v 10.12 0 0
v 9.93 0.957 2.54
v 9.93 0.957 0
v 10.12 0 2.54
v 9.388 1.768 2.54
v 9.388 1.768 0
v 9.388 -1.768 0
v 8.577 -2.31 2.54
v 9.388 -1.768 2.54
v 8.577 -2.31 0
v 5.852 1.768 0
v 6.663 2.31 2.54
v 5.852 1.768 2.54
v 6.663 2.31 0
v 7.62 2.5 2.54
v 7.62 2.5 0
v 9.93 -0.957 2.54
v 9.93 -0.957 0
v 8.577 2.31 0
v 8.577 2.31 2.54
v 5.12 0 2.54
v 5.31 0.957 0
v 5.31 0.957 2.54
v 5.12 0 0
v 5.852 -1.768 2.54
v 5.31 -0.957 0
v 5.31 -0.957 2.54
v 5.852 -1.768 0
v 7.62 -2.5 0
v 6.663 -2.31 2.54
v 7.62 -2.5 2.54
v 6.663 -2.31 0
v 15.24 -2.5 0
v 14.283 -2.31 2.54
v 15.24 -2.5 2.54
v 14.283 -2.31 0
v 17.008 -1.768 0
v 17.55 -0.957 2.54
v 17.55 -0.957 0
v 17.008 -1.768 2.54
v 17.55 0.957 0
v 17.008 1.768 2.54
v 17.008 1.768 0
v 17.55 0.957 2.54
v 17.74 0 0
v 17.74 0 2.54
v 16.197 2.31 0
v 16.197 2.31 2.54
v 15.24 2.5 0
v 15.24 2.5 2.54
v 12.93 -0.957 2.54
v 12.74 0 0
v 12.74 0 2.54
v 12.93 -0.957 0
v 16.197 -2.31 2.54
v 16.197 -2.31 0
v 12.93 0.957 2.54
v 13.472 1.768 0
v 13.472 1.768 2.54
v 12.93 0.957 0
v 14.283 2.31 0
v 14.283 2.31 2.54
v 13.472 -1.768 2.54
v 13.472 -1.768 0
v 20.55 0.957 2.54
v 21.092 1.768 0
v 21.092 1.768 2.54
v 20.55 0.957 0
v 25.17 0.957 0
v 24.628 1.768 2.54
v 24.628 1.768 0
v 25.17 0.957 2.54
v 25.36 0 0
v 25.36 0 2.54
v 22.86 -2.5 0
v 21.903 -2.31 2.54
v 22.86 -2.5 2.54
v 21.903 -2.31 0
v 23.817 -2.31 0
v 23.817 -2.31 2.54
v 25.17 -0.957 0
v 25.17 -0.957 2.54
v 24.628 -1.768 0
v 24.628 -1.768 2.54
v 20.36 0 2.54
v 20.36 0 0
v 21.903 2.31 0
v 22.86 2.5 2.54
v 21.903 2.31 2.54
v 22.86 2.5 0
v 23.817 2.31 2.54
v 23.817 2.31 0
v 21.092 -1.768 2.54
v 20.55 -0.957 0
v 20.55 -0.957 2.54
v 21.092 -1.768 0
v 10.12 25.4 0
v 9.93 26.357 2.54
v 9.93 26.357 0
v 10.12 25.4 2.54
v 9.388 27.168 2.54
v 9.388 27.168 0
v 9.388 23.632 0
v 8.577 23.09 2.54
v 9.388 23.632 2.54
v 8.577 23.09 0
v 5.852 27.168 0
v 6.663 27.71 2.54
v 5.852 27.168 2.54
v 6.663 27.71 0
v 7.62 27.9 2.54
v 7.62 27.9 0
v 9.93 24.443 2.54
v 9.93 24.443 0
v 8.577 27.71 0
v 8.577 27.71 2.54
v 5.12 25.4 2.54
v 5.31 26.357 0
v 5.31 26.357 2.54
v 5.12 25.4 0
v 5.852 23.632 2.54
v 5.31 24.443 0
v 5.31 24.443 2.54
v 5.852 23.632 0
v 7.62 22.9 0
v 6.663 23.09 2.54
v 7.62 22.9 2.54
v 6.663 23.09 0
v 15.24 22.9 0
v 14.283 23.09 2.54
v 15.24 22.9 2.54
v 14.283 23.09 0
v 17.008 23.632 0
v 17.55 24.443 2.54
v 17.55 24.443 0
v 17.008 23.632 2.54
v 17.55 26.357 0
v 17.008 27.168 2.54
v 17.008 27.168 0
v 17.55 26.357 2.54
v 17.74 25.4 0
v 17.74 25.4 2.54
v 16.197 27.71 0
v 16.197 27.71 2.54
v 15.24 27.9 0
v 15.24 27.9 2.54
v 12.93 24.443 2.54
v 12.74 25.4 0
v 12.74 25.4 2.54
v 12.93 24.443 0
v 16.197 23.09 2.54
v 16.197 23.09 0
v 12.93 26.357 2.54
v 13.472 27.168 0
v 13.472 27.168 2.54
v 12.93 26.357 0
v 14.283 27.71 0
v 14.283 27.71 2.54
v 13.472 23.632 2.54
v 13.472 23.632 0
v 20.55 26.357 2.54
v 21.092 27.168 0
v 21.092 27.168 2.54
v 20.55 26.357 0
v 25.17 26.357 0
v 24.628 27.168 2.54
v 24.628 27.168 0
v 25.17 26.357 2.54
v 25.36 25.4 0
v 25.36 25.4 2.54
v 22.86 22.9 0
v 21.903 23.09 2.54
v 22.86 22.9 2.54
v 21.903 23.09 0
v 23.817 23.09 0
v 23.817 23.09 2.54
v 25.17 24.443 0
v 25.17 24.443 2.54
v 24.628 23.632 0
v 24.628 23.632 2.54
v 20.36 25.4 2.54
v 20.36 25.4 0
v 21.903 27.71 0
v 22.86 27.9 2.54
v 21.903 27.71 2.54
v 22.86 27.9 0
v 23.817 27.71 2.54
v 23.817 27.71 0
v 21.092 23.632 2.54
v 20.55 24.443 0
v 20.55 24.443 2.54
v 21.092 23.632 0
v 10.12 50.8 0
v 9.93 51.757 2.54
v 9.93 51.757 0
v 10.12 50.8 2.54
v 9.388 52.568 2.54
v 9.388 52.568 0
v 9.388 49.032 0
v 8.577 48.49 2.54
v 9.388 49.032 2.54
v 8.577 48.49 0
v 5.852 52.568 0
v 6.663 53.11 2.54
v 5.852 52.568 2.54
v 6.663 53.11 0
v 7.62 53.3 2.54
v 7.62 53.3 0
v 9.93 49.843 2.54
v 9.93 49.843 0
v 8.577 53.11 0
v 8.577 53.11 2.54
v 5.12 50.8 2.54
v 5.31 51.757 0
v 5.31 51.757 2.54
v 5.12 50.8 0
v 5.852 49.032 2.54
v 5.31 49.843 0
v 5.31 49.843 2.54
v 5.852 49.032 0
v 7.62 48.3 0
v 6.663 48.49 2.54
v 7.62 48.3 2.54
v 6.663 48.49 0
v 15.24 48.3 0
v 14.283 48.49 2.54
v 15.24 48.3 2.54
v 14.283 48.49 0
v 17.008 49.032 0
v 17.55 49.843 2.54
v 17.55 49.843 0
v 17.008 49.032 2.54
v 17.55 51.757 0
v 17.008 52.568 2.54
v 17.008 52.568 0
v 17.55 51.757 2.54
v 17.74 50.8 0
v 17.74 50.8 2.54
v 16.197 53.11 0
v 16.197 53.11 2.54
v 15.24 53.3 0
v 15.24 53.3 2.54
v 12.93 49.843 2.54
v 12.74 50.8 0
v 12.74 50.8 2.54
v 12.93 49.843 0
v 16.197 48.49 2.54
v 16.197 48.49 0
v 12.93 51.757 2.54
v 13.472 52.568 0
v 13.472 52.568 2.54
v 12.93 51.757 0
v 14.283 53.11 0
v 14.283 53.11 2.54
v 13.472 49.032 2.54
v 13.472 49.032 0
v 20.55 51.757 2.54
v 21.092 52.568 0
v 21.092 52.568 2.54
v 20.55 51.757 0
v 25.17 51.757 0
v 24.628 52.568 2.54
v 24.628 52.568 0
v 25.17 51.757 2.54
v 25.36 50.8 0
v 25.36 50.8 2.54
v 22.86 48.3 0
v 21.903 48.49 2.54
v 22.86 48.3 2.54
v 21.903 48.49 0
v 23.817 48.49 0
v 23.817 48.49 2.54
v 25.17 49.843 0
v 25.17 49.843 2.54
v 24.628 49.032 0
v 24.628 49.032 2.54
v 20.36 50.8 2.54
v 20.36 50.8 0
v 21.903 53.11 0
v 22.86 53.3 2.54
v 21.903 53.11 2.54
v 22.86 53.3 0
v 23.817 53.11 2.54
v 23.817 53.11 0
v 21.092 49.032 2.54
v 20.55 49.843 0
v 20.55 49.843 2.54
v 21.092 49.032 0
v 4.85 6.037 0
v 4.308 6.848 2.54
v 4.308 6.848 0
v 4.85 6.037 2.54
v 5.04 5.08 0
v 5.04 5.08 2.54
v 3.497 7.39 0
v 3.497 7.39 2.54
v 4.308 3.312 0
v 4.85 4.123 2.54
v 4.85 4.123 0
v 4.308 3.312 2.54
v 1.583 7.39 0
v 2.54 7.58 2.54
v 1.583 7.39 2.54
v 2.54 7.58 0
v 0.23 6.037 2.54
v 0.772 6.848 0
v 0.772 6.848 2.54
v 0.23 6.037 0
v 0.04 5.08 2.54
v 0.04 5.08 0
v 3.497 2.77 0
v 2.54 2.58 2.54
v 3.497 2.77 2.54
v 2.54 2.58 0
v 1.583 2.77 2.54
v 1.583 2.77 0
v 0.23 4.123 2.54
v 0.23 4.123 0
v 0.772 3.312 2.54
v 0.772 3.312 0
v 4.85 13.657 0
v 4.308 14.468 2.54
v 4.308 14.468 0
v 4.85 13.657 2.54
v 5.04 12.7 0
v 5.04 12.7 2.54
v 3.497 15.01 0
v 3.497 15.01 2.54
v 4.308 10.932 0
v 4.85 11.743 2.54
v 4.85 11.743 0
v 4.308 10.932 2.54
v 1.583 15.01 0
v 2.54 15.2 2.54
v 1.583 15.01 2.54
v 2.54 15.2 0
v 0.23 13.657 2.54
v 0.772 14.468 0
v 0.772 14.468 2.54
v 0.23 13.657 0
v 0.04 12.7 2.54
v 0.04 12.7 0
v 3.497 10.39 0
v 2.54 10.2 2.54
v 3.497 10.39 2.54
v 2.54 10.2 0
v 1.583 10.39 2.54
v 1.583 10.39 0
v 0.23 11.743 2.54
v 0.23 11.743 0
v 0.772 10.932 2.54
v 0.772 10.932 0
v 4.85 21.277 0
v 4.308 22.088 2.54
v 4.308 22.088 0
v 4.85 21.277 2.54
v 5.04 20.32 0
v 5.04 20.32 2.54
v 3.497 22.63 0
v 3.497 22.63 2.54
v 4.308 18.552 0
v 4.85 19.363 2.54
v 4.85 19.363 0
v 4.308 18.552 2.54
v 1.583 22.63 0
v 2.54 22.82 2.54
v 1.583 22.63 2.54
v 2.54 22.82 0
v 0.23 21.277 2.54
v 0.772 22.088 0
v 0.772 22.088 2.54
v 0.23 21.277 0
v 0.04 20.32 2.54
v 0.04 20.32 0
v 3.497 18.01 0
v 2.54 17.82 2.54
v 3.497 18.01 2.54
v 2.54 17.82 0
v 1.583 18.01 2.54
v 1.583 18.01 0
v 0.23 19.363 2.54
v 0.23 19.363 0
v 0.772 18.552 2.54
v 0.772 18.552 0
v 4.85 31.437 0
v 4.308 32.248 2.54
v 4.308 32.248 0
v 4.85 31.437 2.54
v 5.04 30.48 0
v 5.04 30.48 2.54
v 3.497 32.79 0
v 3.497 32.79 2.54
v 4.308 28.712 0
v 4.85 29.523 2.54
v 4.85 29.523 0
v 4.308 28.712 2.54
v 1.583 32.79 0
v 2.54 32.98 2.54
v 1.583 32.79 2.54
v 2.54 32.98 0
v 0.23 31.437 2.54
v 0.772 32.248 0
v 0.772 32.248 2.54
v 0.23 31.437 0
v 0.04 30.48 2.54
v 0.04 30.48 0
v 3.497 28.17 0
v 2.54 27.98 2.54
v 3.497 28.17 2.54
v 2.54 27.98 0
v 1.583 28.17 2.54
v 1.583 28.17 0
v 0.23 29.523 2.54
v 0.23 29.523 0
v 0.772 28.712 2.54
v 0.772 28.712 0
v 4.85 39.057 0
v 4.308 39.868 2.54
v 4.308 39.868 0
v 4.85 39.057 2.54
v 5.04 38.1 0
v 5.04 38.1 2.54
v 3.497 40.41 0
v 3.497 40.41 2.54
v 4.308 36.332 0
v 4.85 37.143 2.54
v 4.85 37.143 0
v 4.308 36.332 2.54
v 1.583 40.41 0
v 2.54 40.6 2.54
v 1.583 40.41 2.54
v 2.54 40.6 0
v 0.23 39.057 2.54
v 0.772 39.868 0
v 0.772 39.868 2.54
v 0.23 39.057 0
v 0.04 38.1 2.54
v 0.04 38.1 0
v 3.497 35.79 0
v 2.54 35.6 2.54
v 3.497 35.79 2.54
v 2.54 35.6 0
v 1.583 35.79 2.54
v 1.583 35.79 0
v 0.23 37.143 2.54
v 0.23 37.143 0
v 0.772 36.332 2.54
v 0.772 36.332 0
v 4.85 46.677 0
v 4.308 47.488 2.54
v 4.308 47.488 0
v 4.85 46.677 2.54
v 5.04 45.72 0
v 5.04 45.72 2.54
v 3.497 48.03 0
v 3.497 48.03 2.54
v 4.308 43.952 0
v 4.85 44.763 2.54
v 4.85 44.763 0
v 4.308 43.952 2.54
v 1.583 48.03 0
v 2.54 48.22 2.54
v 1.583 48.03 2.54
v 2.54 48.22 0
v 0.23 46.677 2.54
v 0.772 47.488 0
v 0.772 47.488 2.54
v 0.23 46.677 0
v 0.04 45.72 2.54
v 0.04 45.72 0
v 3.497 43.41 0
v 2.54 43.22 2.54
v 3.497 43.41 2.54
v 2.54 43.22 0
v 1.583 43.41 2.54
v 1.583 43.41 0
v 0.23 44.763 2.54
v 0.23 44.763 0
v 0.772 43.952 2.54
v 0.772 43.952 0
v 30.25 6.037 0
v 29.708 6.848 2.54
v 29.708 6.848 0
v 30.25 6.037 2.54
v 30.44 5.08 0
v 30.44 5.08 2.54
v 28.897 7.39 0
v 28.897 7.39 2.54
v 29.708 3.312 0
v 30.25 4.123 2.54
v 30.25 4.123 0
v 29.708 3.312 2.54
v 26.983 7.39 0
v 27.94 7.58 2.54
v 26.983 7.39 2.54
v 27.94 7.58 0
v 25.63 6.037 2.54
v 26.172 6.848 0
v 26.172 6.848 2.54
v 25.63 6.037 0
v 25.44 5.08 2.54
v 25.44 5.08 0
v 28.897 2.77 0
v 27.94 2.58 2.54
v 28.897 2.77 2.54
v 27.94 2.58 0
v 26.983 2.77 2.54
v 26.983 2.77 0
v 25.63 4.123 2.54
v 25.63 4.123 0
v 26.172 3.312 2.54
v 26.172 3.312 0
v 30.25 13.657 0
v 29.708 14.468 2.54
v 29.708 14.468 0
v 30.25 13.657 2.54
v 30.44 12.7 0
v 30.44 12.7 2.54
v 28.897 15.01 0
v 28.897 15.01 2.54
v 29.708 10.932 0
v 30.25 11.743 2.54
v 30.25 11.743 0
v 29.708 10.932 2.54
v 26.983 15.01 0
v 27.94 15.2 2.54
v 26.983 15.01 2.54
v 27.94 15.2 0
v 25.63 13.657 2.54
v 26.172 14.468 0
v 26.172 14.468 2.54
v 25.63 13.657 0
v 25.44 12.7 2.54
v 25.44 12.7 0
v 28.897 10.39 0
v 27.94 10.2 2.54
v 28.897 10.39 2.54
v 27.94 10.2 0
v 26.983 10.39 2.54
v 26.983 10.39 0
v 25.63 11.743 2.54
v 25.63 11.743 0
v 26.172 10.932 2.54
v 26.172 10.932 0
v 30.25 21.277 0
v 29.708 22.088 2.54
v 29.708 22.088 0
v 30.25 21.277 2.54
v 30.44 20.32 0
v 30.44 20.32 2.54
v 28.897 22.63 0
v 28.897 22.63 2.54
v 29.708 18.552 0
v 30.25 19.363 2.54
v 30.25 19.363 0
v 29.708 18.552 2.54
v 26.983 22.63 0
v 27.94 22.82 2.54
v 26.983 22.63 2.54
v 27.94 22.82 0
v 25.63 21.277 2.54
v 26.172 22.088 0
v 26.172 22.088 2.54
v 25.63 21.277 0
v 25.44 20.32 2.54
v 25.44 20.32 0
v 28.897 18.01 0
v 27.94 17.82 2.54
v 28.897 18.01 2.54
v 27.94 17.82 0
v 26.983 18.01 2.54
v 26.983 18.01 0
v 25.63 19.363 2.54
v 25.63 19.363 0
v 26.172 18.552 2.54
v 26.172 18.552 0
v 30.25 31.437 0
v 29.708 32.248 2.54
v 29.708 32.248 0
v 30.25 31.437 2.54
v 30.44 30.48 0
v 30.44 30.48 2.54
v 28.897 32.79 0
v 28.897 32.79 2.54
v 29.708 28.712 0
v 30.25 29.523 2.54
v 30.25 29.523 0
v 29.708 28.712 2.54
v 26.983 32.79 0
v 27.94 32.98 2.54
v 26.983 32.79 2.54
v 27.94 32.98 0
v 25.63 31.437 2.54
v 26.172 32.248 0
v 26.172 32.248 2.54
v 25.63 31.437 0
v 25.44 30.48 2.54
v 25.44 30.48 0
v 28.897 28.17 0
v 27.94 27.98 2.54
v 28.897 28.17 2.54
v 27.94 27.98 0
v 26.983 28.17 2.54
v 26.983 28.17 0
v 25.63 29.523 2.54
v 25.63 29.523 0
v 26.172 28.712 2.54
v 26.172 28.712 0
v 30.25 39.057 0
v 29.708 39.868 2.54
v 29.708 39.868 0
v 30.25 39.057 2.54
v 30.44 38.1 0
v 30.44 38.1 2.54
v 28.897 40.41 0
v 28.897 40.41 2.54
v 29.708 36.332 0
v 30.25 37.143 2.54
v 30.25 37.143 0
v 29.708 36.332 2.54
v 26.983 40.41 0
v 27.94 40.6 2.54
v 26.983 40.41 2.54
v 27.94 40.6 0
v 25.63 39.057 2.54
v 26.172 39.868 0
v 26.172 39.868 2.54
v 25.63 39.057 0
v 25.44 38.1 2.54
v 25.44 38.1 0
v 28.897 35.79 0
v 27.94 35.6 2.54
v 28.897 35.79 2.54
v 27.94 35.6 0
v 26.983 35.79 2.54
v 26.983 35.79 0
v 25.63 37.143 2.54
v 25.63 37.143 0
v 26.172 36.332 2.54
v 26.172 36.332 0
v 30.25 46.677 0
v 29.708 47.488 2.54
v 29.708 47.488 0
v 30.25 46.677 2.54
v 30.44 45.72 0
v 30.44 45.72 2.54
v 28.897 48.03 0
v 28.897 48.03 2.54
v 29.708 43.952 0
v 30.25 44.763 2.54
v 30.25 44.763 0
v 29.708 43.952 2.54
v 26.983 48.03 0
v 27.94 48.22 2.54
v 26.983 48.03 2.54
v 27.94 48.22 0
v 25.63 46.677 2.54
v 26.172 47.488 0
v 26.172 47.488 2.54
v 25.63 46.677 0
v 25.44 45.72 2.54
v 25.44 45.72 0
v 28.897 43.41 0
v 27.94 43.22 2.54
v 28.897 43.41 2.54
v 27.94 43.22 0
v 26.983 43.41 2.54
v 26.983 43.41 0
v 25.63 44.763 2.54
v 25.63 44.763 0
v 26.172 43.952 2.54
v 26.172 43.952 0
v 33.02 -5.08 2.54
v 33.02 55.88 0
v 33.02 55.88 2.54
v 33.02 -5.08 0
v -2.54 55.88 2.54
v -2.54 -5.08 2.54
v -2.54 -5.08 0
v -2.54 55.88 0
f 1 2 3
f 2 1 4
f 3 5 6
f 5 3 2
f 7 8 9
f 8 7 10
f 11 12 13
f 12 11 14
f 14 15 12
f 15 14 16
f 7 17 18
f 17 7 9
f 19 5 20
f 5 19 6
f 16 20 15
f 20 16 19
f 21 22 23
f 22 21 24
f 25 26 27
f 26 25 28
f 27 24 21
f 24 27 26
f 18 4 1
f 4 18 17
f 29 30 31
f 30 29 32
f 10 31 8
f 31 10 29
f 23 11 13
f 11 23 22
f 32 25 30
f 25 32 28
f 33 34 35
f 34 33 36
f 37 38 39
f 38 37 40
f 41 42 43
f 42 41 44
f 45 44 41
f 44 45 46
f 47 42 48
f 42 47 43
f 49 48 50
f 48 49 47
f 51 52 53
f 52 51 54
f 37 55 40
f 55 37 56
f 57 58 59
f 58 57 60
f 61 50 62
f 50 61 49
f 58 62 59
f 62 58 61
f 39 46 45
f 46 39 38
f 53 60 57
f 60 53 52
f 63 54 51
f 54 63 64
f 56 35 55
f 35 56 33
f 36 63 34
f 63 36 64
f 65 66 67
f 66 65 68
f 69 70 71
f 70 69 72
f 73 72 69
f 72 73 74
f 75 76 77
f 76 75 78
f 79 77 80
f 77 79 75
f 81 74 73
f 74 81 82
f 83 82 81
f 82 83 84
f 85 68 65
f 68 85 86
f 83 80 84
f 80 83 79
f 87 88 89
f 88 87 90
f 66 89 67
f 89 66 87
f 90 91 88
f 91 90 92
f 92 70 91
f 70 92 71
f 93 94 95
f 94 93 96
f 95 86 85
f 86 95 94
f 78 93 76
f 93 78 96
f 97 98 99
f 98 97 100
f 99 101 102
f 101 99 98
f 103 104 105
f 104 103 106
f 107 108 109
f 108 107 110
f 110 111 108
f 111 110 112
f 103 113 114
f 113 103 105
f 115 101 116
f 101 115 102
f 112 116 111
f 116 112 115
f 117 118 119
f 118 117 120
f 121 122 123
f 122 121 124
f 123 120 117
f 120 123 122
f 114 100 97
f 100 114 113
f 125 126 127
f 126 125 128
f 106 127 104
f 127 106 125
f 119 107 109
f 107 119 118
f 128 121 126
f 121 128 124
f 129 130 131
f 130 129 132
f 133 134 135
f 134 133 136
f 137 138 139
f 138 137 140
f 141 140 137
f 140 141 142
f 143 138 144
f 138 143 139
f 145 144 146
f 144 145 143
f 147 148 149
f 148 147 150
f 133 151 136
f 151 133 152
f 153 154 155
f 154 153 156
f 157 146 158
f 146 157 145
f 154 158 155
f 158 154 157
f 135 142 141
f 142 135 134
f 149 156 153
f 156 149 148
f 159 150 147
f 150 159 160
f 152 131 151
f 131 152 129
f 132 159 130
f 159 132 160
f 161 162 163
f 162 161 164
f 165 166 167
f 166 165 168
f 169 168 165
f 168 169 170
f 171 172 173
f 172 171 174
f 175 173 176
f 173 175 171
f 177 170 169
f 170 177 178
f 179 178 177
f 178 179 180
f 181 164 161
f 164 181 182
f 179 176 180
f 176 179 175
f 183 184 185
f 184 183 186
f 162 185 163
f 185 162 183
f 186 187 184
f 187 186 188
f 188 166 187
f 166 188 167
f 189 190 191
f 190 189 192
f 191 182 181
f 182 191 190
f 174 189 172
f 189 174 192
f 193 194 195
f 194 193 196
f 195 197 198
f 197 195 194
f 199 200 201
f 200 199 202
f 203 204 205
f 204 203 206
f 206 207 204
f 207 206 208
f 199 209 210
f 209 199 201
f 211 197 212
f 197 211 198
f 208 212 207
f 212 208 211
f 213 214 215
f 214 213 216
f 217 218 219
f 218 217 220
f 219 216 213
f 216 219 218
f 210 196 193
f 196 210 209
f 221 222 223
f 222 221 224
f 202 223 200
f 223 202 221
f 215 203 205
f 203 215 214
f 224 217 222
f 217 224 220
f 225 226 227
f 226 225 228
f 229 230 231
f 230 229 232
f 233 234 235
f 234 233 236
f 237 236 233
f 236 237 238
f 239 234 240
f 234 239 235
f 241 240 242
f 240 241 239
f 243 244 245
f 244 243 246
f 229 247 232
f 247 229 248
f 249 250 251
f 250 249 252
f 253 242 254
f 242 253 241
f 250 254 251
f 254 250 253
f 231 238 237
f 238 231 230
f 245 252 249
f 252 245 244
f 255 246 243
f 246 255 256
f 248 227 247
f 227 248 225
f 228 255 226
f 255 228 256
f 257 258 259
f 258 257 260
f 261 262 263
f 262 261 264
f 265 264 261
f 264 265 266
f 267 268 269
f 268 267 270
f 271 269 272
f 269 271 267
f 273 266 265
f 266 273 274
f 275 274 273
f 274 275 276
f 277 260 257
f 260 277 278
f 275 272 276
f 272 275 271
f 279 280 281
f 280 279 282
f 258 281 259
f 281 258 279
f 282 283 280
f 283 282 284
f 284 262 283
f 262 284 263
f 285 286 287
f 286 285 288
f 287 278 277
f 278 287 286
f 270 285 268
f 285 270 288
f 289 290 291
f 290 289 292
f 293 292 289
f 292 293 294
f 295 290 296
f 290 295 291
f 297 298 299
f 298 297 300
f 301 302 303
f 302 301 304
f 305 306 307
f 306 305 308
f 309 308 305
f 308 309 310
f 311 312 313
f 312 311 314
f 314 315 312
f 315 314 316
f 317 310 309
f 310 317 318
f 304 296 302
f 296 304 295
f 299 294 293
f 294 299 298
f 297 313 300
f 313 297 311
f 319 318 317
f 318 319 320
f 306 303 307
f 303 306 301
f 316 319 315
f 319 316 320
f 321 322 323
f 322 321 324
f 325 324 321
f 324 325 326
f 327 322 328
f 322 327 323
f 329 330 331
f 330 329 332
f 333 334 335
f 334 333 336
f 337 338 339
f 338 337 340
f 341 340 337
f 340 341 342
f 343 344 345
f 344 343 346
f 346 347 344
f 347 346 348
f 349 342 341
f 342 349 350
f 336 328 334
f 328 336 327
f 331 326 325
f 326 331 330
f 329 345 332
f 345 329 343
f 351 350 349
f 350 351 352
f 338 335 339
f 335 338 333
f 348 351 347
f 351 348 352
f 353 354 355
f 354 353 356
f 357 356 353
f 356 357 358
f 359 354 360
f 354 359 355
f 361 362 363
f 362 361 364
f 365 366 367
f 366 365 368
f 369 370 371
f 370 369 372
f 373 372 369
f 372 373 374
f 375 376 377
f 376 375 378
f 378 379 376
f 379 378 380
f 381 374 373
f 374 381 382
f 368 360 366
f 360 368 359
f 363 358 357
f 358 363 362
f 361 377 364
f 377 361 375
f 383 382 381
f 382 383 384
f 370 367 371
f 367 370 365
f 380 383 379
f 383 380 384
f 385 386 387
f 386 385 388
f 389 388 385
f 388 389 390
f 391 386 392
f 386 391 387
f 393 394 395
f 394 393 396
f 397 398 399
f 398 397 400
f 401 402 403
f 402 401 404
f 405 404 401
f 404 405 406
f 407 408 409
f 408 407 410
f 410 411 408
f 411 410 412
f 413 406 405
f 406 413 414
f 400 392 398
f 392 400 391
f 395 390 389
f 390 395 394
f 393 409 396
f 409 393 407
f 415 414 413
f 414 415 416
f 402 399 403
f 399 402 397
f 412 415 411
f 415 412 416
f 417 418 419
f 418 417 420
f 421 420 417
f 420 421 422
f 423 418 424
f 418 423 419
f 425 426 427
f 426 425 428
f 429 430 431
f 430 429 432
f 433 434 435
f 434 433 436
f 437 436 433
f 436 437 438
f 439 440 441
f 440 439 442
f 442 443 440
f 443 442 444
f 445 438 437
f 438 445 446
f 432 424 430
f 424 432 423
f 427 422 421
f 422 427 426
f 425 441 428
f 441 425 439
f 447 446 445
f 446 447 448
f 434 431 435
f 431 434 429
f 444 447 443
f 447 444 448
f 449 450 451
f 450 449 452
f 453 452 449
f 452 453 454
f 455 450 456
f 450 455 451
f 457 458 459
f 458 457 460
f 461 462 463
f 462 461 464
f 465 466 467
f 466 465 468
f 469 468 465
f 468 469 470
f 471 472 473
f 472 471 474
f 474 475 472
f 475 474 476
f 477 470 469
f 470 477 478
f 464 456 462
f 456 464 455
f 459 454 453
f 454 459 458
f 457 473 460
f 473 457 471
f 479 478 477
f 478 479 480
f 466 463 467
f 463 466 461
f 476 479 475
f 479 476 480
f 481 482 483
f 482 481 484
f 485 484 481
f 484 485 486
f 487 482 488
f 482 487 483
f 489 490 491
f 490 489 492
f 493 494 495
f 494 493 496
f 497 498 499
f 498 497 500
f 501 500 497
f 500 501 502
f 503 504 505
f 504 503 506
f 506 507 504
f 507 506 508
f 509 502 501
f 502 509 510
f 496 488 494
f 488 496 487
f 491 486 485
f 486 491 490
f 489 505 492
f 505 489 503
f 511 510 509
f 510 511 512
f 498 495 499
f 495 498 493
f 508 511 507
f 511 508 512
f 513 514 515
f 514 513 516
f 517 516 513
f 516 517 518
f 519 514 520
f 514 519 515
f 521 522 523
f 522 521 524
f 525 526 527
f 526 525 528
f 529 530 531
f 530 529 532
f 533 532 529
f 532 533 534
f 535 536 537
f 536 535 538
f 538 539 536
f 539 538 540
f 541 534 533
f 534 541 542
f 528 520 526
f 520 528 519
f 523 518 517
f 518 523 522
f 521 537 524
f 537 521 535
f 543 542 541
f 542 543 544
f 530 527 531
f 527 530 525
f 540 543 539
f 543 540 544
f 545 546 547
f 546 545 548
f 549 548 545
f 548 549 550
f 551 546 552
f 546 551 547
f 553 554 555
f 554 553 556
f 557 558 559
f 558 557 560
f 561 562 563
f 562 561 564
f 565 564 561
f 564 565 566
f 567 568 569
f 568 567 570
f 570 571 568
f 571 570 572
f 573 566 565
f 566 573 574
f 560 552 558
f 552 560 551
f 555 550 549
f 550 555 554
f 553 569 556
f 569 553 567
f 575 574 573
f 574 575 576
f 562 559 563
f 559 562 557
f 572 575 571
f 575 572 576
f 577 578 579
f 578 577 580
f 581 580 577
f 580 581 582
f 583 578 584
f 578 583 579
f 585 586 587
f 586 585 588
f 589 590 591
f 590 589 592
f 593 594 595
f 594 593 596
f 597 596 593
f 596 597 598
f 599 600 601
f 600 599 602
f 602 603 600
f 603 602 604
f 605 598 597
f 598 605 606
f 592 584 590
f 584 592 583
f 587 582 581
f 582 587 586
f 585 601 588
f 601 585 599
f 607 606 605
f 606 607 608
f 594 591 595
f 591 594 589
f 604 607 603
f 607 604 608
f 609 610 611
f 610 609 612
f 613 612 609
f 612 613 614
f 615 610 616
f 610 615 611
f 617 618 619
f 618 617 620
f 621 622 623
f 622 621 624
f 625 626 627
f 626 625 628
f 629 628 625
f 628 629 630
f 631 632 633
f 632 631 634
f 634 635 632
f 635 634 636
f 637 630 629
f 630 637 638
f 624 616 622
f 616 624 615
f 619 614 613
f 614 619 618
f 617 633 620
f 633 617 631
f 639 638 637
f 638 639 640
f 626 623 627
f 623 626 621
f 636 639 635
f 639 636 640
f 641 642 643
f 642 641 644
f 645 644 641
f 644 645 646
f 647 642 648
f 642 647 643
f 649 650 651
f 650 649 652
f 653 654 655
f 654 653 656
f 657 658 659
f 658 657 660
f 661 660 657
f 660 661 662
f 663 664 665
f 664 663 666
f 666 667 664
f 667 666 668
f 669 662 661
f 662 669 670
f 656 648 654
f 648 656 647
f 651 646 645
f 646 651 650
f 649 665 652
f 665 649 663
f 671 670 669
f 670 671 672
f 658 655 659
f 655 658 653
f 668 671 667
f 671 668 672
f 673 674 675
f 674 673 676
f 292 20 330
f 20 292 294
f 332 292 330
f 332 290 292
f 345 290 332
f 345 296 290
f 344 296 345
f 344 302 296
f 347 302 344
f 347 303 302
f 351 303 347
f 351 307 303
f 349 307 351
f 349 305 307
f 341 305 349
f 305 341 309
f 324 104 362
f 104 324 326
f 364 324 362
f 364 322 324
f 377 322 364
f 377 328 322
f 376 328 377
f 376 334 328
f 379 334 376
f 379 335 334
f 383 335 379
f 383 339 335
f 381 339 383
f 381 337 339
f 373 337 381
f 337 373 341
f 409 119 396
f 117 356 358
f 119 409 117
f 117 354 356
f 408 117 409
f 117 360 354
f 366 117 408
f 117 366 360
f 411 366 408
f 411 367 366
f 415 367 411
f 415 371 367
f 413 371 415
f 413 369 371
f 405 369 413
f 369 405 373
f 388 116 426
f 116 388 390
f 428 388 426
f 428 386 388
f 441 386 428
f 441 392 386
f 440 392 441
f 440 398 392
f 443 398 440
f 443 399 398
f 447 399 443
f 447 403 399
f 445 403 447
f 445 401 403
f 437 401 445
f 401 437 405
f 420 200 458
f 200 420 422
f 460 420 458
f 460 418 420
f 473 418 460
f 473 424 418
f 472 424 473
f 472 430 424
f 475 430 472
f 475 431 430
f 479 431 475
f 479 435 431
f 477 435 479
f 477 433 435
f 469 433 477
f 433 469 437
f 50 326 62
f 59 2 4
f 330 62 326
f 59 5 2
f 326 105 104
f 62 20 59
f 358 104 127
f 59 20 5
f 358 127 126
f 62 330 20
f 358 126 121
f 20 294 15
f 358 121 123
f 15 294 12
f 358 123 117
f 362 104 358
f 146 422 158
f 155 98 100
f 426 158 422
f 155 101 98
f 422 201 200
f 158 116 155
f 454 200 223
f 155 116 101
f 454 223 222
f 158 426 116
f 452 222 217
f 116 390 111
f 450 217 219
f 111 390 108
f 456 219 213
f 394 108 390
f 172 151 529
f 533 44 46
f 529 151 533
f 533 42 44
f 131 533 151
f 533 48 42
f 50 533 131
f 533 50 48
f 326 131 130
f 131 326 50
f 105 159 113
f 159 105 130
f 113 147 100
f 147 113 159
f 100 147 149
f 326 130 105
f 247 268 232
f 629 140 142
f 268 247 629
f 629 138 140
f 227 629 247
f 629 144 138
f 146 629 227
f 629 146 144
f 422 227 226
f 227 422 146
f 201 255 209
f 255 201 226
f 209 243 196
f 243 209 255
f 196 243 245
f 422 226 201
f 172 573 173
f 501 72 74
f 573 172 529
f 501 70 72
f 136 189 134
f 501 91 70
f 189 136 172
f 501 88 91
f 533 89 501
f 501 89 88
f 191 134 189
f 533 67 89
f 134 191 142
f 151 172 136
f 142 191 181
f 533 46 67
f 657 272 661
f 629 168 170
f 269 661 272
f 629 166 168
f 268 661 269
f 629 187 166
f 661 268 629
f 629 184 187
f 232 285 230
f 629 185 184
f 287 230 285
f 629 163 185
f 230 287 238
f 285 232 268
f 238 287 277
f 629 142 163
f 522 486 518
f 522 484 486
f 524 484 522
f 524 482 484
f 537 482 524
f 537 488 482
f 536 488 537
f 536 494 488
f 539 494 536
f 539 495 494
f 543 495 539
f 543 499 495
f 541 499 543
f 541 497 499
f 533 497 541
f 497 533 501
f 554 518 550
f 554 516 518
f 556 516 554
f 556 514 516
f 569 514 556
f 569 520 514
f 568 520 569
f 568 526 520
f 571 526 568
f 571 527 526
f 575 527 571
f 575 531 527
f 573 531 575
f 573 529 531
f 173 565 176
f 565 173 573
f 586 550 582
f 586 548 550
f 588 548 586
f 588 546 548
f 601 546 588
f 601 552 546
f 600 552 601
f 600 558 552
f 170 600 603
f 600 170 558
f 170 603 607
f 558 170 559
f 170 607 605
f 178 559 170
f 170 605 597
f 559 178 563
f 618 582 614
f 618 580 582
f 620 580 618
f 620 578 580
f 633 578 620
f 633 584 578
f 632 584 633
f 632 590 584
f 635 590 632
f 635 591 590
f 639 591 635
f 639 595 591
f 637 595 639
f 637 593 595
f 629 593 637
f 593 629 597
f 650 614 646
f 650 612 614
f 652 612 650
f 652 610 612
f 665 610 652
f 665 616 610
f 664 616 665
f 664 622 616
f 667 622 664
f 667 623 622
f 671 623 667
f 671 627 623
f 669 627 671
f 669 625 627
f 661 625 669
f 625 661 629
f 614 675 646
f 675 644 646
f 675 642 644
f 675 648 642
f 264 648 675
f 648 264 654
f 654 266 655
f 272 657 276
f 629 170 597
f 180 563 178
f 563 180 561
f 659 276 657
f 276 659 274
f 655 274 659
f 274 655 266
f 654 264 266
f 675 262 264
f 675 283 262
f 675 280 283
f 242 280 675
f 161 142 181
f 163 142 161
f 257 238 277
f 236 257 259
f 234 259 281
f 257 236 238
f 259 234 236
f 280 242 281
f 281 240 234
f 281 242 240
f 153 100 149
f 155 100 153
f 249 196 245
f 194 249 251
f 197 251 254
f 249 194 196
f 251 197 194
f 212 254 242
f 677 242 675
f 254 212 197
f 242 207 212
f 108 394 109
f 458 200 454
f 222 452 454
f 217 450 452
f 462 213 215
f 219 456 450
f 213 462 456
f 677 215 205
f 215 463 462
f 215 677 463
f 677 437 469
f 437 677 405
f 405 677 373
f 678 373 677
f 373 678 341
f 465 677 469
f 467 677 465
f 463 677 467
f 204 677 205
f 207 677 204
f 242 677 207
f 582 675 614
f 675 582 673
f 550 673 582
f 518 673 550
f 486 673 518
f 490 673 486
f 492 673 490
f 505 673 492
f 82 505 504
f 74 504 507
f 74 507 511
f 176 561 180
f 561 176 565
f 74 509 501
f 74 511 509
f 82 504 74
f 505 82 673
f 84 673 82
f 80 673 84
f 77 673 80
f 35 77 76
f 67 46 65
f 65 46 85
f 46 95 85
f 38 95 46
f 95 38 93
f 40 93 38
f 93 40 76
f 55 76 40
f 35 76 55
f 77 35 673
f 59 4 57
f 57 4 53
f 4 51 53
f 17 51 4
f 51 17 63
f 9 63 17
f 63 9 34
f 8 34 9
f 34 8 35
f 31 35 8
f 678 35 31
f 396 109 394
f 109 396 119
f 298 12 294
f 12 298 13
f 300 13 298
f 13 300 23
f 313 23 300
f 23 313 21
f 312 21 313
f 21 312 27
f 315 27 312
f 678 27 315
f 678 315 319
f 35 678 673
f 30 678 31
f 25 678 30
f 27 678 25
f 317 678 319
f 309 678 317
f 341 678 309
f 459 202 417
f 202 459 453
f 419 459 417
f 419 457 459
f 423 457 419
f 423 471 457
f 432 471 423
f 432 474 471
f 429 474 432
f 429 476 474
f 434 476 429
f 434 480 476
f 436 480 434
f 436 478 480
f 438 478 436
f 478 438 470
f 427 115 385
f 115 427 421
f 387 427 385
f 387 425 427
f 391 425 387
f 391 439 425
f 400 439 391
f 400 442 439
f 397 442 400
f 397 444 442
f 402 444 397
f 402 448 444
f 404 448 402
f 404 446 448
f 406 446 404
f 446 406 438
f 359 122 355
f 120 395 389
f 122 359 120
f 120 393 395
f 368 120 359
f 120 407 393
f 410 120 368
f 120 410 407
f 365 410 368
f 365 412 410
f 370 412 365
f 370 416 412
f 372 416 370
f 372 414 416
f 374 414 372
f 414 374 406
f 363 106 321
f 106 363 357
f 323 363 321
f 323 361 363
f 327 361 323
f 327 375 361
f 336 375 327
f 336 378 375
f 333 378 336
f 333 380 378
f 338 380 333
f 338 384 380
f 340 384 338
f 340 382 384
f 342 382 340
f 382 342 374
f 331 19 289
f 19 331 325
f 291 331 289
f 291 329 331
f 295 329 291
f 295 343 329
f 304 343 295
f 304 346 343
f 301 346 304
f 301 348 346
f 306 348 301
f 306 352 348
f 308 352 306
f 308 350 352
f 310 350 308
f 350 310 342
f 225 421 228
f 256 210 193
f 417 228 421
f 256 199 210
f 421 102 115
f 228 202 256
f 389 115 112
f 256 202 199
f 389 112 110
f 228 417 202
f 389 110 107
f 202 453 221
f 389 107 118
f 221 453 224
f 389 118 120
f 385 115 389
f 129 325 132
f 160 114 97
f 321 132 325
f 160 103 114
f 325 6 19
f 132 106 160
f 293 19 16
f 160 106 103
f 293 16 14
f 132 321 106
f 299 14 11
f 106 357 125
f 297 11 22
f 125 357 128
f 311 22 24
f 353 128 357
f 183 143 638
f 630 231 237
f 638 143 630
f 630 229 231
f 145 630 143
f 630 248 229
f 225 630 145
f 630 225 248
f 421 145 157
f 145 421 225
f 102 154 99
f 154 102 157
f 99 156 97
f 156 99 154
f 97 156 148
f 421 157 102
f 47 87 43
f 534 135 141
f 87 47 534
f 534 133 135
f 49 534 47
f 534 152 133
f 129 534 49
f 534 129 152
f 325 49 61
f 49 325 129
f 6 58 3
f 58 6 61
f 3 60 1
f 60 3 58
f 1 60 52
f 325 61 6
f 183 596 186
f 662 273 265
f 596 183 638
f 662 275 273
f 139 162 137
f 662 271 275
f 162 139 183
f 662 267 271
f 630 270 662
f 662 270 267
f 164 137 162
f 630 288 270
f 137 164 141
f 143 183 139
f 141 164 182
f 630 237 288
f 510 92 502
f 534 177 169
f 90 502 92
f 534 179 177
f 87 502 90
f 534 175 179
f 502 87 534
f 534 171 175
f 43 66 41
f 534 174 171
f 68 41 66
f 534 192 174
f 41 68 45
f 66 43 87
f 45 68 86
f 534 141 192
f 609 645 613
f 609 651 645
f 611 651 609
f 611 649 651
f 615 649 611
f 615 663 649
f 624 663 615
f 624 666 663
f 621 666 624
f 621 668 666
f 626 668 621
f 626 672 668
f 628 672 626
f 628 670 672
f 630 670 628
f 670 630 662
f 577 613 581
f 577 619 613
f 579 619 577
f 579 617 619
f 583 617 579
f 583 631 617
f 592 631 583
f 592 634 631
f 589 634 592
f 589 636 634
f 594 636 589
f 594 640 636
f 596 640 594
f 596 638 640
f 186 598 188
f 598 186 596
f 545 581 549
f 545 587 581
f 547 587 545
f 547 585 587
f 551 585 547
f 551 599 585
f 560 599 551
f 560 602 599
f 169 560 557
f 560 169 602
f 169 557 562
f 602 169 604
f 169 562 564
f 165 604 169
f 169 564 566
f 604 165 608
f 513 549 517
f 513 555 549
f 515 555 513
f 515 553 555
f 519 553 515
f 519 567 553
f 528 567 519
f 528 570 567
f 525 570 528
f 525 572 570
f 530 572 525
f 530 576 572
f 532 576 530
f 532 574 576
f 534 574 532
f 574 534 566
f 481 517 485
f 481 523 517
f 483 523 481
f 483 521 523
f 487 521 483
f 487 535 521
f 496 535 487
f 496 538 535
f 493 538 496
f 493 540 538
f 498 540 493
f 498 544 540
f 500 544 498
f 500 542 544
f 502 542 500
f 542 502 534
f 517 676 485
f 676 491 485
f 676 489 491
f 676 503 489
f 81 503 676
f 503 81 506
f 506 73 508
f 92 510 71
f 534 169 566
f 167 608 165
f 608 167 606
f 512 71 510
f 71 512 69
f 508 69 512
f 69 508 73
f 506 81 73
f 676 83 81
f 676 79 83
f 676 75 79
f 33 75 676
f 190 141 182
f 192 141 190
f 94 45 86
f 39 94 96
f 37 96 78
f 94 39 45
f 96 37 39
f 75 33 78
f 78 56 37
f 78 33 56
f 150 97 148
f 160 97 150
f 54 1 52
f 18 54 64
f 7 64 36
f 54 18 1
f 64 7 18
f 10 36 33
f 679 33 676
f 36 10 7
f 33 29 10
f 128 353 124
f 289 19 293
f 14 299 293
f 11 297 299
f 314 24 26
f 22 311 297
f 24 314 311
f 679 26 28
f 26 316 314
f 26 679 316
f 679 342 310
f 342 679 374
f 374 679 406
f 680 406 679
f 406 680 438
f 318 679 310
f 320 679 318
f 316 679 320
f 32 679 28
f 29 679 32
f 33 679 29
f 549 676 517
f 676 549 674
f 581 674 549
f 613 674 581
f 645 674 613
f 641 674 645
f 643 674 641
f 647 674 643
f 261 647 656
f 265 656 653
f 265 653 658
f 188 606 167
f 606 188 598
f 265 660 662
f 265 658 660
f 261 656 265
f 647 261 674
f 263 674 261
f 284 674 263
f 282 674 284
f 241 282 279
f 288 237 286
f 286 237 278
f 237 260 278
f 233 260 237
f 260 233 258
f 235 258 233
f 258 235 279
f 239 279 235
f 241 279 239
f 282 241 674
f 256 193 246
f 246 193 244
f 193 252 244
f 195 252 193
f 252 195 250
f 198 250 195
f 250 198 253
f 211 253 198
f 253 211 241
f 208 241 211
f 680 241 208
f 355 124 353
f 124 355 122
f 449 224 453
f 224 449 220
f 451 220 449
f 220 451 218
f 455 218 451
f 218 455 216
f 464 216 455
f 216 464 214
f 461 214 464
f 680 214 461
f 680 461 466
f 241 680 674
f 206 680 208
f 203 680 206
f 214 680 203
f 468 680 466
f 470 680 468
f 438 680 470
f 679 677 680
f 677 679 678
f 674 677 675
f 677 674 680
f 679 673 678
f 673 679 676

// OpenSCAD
grid=2.54;
unit_height=2.54;
hole_size=5;

number_of_units=1;

//  - segment
module horizontal_segment()
 {
union()
{
translate([2*grid,0,-1])
cylinder(h=unit_height+2,r=hole_size/2,$fn=16);
translate([5*grid,0,-1])
cylinder(h=unit_height+2,r=hole_size/2,$fn=16);
translate([8*grid,0,-1])
cylinder(h=unit_height+2,r=hole_size/2,$fn=16);
}
}

// | Segment
module vertical_segment()
{
union()
{
translate([0,2*grid,-1])
cylinder(h=unit_height+2,r=hole_size/2,$fn=16);
translate([0,5*grid,-1])
cylinder(h=unit_height+2,r=hole_size/2,$fn=16);
translate([0,8*grid,-1])
cylinder(h=unit_height+2,r=hole_size/2,$fn=16);
}
}

module display_unit()
{
difference()
{
translate([-2*grid,-2*grid,0])
cube ([14*grid,24*grid,unit_height]);

translate([0,0,0])
horizontal_segment();
translate([0,10*grid,0])
horizontal_segment();
translate([0,20*grid,0])
horizontal_segment();

translate([0,0,0])
vertical_segment();
translate([0,10*grid,0])
vertical_segment();
translate([10*grid,0,0])
vertical_segment();
translate([10*grid,10*grid,0])
vertical_segment();
}
}

for (i=[1:14:number_of_units*14])
{
translate([i*grid,0,0])
display_unit();
}
